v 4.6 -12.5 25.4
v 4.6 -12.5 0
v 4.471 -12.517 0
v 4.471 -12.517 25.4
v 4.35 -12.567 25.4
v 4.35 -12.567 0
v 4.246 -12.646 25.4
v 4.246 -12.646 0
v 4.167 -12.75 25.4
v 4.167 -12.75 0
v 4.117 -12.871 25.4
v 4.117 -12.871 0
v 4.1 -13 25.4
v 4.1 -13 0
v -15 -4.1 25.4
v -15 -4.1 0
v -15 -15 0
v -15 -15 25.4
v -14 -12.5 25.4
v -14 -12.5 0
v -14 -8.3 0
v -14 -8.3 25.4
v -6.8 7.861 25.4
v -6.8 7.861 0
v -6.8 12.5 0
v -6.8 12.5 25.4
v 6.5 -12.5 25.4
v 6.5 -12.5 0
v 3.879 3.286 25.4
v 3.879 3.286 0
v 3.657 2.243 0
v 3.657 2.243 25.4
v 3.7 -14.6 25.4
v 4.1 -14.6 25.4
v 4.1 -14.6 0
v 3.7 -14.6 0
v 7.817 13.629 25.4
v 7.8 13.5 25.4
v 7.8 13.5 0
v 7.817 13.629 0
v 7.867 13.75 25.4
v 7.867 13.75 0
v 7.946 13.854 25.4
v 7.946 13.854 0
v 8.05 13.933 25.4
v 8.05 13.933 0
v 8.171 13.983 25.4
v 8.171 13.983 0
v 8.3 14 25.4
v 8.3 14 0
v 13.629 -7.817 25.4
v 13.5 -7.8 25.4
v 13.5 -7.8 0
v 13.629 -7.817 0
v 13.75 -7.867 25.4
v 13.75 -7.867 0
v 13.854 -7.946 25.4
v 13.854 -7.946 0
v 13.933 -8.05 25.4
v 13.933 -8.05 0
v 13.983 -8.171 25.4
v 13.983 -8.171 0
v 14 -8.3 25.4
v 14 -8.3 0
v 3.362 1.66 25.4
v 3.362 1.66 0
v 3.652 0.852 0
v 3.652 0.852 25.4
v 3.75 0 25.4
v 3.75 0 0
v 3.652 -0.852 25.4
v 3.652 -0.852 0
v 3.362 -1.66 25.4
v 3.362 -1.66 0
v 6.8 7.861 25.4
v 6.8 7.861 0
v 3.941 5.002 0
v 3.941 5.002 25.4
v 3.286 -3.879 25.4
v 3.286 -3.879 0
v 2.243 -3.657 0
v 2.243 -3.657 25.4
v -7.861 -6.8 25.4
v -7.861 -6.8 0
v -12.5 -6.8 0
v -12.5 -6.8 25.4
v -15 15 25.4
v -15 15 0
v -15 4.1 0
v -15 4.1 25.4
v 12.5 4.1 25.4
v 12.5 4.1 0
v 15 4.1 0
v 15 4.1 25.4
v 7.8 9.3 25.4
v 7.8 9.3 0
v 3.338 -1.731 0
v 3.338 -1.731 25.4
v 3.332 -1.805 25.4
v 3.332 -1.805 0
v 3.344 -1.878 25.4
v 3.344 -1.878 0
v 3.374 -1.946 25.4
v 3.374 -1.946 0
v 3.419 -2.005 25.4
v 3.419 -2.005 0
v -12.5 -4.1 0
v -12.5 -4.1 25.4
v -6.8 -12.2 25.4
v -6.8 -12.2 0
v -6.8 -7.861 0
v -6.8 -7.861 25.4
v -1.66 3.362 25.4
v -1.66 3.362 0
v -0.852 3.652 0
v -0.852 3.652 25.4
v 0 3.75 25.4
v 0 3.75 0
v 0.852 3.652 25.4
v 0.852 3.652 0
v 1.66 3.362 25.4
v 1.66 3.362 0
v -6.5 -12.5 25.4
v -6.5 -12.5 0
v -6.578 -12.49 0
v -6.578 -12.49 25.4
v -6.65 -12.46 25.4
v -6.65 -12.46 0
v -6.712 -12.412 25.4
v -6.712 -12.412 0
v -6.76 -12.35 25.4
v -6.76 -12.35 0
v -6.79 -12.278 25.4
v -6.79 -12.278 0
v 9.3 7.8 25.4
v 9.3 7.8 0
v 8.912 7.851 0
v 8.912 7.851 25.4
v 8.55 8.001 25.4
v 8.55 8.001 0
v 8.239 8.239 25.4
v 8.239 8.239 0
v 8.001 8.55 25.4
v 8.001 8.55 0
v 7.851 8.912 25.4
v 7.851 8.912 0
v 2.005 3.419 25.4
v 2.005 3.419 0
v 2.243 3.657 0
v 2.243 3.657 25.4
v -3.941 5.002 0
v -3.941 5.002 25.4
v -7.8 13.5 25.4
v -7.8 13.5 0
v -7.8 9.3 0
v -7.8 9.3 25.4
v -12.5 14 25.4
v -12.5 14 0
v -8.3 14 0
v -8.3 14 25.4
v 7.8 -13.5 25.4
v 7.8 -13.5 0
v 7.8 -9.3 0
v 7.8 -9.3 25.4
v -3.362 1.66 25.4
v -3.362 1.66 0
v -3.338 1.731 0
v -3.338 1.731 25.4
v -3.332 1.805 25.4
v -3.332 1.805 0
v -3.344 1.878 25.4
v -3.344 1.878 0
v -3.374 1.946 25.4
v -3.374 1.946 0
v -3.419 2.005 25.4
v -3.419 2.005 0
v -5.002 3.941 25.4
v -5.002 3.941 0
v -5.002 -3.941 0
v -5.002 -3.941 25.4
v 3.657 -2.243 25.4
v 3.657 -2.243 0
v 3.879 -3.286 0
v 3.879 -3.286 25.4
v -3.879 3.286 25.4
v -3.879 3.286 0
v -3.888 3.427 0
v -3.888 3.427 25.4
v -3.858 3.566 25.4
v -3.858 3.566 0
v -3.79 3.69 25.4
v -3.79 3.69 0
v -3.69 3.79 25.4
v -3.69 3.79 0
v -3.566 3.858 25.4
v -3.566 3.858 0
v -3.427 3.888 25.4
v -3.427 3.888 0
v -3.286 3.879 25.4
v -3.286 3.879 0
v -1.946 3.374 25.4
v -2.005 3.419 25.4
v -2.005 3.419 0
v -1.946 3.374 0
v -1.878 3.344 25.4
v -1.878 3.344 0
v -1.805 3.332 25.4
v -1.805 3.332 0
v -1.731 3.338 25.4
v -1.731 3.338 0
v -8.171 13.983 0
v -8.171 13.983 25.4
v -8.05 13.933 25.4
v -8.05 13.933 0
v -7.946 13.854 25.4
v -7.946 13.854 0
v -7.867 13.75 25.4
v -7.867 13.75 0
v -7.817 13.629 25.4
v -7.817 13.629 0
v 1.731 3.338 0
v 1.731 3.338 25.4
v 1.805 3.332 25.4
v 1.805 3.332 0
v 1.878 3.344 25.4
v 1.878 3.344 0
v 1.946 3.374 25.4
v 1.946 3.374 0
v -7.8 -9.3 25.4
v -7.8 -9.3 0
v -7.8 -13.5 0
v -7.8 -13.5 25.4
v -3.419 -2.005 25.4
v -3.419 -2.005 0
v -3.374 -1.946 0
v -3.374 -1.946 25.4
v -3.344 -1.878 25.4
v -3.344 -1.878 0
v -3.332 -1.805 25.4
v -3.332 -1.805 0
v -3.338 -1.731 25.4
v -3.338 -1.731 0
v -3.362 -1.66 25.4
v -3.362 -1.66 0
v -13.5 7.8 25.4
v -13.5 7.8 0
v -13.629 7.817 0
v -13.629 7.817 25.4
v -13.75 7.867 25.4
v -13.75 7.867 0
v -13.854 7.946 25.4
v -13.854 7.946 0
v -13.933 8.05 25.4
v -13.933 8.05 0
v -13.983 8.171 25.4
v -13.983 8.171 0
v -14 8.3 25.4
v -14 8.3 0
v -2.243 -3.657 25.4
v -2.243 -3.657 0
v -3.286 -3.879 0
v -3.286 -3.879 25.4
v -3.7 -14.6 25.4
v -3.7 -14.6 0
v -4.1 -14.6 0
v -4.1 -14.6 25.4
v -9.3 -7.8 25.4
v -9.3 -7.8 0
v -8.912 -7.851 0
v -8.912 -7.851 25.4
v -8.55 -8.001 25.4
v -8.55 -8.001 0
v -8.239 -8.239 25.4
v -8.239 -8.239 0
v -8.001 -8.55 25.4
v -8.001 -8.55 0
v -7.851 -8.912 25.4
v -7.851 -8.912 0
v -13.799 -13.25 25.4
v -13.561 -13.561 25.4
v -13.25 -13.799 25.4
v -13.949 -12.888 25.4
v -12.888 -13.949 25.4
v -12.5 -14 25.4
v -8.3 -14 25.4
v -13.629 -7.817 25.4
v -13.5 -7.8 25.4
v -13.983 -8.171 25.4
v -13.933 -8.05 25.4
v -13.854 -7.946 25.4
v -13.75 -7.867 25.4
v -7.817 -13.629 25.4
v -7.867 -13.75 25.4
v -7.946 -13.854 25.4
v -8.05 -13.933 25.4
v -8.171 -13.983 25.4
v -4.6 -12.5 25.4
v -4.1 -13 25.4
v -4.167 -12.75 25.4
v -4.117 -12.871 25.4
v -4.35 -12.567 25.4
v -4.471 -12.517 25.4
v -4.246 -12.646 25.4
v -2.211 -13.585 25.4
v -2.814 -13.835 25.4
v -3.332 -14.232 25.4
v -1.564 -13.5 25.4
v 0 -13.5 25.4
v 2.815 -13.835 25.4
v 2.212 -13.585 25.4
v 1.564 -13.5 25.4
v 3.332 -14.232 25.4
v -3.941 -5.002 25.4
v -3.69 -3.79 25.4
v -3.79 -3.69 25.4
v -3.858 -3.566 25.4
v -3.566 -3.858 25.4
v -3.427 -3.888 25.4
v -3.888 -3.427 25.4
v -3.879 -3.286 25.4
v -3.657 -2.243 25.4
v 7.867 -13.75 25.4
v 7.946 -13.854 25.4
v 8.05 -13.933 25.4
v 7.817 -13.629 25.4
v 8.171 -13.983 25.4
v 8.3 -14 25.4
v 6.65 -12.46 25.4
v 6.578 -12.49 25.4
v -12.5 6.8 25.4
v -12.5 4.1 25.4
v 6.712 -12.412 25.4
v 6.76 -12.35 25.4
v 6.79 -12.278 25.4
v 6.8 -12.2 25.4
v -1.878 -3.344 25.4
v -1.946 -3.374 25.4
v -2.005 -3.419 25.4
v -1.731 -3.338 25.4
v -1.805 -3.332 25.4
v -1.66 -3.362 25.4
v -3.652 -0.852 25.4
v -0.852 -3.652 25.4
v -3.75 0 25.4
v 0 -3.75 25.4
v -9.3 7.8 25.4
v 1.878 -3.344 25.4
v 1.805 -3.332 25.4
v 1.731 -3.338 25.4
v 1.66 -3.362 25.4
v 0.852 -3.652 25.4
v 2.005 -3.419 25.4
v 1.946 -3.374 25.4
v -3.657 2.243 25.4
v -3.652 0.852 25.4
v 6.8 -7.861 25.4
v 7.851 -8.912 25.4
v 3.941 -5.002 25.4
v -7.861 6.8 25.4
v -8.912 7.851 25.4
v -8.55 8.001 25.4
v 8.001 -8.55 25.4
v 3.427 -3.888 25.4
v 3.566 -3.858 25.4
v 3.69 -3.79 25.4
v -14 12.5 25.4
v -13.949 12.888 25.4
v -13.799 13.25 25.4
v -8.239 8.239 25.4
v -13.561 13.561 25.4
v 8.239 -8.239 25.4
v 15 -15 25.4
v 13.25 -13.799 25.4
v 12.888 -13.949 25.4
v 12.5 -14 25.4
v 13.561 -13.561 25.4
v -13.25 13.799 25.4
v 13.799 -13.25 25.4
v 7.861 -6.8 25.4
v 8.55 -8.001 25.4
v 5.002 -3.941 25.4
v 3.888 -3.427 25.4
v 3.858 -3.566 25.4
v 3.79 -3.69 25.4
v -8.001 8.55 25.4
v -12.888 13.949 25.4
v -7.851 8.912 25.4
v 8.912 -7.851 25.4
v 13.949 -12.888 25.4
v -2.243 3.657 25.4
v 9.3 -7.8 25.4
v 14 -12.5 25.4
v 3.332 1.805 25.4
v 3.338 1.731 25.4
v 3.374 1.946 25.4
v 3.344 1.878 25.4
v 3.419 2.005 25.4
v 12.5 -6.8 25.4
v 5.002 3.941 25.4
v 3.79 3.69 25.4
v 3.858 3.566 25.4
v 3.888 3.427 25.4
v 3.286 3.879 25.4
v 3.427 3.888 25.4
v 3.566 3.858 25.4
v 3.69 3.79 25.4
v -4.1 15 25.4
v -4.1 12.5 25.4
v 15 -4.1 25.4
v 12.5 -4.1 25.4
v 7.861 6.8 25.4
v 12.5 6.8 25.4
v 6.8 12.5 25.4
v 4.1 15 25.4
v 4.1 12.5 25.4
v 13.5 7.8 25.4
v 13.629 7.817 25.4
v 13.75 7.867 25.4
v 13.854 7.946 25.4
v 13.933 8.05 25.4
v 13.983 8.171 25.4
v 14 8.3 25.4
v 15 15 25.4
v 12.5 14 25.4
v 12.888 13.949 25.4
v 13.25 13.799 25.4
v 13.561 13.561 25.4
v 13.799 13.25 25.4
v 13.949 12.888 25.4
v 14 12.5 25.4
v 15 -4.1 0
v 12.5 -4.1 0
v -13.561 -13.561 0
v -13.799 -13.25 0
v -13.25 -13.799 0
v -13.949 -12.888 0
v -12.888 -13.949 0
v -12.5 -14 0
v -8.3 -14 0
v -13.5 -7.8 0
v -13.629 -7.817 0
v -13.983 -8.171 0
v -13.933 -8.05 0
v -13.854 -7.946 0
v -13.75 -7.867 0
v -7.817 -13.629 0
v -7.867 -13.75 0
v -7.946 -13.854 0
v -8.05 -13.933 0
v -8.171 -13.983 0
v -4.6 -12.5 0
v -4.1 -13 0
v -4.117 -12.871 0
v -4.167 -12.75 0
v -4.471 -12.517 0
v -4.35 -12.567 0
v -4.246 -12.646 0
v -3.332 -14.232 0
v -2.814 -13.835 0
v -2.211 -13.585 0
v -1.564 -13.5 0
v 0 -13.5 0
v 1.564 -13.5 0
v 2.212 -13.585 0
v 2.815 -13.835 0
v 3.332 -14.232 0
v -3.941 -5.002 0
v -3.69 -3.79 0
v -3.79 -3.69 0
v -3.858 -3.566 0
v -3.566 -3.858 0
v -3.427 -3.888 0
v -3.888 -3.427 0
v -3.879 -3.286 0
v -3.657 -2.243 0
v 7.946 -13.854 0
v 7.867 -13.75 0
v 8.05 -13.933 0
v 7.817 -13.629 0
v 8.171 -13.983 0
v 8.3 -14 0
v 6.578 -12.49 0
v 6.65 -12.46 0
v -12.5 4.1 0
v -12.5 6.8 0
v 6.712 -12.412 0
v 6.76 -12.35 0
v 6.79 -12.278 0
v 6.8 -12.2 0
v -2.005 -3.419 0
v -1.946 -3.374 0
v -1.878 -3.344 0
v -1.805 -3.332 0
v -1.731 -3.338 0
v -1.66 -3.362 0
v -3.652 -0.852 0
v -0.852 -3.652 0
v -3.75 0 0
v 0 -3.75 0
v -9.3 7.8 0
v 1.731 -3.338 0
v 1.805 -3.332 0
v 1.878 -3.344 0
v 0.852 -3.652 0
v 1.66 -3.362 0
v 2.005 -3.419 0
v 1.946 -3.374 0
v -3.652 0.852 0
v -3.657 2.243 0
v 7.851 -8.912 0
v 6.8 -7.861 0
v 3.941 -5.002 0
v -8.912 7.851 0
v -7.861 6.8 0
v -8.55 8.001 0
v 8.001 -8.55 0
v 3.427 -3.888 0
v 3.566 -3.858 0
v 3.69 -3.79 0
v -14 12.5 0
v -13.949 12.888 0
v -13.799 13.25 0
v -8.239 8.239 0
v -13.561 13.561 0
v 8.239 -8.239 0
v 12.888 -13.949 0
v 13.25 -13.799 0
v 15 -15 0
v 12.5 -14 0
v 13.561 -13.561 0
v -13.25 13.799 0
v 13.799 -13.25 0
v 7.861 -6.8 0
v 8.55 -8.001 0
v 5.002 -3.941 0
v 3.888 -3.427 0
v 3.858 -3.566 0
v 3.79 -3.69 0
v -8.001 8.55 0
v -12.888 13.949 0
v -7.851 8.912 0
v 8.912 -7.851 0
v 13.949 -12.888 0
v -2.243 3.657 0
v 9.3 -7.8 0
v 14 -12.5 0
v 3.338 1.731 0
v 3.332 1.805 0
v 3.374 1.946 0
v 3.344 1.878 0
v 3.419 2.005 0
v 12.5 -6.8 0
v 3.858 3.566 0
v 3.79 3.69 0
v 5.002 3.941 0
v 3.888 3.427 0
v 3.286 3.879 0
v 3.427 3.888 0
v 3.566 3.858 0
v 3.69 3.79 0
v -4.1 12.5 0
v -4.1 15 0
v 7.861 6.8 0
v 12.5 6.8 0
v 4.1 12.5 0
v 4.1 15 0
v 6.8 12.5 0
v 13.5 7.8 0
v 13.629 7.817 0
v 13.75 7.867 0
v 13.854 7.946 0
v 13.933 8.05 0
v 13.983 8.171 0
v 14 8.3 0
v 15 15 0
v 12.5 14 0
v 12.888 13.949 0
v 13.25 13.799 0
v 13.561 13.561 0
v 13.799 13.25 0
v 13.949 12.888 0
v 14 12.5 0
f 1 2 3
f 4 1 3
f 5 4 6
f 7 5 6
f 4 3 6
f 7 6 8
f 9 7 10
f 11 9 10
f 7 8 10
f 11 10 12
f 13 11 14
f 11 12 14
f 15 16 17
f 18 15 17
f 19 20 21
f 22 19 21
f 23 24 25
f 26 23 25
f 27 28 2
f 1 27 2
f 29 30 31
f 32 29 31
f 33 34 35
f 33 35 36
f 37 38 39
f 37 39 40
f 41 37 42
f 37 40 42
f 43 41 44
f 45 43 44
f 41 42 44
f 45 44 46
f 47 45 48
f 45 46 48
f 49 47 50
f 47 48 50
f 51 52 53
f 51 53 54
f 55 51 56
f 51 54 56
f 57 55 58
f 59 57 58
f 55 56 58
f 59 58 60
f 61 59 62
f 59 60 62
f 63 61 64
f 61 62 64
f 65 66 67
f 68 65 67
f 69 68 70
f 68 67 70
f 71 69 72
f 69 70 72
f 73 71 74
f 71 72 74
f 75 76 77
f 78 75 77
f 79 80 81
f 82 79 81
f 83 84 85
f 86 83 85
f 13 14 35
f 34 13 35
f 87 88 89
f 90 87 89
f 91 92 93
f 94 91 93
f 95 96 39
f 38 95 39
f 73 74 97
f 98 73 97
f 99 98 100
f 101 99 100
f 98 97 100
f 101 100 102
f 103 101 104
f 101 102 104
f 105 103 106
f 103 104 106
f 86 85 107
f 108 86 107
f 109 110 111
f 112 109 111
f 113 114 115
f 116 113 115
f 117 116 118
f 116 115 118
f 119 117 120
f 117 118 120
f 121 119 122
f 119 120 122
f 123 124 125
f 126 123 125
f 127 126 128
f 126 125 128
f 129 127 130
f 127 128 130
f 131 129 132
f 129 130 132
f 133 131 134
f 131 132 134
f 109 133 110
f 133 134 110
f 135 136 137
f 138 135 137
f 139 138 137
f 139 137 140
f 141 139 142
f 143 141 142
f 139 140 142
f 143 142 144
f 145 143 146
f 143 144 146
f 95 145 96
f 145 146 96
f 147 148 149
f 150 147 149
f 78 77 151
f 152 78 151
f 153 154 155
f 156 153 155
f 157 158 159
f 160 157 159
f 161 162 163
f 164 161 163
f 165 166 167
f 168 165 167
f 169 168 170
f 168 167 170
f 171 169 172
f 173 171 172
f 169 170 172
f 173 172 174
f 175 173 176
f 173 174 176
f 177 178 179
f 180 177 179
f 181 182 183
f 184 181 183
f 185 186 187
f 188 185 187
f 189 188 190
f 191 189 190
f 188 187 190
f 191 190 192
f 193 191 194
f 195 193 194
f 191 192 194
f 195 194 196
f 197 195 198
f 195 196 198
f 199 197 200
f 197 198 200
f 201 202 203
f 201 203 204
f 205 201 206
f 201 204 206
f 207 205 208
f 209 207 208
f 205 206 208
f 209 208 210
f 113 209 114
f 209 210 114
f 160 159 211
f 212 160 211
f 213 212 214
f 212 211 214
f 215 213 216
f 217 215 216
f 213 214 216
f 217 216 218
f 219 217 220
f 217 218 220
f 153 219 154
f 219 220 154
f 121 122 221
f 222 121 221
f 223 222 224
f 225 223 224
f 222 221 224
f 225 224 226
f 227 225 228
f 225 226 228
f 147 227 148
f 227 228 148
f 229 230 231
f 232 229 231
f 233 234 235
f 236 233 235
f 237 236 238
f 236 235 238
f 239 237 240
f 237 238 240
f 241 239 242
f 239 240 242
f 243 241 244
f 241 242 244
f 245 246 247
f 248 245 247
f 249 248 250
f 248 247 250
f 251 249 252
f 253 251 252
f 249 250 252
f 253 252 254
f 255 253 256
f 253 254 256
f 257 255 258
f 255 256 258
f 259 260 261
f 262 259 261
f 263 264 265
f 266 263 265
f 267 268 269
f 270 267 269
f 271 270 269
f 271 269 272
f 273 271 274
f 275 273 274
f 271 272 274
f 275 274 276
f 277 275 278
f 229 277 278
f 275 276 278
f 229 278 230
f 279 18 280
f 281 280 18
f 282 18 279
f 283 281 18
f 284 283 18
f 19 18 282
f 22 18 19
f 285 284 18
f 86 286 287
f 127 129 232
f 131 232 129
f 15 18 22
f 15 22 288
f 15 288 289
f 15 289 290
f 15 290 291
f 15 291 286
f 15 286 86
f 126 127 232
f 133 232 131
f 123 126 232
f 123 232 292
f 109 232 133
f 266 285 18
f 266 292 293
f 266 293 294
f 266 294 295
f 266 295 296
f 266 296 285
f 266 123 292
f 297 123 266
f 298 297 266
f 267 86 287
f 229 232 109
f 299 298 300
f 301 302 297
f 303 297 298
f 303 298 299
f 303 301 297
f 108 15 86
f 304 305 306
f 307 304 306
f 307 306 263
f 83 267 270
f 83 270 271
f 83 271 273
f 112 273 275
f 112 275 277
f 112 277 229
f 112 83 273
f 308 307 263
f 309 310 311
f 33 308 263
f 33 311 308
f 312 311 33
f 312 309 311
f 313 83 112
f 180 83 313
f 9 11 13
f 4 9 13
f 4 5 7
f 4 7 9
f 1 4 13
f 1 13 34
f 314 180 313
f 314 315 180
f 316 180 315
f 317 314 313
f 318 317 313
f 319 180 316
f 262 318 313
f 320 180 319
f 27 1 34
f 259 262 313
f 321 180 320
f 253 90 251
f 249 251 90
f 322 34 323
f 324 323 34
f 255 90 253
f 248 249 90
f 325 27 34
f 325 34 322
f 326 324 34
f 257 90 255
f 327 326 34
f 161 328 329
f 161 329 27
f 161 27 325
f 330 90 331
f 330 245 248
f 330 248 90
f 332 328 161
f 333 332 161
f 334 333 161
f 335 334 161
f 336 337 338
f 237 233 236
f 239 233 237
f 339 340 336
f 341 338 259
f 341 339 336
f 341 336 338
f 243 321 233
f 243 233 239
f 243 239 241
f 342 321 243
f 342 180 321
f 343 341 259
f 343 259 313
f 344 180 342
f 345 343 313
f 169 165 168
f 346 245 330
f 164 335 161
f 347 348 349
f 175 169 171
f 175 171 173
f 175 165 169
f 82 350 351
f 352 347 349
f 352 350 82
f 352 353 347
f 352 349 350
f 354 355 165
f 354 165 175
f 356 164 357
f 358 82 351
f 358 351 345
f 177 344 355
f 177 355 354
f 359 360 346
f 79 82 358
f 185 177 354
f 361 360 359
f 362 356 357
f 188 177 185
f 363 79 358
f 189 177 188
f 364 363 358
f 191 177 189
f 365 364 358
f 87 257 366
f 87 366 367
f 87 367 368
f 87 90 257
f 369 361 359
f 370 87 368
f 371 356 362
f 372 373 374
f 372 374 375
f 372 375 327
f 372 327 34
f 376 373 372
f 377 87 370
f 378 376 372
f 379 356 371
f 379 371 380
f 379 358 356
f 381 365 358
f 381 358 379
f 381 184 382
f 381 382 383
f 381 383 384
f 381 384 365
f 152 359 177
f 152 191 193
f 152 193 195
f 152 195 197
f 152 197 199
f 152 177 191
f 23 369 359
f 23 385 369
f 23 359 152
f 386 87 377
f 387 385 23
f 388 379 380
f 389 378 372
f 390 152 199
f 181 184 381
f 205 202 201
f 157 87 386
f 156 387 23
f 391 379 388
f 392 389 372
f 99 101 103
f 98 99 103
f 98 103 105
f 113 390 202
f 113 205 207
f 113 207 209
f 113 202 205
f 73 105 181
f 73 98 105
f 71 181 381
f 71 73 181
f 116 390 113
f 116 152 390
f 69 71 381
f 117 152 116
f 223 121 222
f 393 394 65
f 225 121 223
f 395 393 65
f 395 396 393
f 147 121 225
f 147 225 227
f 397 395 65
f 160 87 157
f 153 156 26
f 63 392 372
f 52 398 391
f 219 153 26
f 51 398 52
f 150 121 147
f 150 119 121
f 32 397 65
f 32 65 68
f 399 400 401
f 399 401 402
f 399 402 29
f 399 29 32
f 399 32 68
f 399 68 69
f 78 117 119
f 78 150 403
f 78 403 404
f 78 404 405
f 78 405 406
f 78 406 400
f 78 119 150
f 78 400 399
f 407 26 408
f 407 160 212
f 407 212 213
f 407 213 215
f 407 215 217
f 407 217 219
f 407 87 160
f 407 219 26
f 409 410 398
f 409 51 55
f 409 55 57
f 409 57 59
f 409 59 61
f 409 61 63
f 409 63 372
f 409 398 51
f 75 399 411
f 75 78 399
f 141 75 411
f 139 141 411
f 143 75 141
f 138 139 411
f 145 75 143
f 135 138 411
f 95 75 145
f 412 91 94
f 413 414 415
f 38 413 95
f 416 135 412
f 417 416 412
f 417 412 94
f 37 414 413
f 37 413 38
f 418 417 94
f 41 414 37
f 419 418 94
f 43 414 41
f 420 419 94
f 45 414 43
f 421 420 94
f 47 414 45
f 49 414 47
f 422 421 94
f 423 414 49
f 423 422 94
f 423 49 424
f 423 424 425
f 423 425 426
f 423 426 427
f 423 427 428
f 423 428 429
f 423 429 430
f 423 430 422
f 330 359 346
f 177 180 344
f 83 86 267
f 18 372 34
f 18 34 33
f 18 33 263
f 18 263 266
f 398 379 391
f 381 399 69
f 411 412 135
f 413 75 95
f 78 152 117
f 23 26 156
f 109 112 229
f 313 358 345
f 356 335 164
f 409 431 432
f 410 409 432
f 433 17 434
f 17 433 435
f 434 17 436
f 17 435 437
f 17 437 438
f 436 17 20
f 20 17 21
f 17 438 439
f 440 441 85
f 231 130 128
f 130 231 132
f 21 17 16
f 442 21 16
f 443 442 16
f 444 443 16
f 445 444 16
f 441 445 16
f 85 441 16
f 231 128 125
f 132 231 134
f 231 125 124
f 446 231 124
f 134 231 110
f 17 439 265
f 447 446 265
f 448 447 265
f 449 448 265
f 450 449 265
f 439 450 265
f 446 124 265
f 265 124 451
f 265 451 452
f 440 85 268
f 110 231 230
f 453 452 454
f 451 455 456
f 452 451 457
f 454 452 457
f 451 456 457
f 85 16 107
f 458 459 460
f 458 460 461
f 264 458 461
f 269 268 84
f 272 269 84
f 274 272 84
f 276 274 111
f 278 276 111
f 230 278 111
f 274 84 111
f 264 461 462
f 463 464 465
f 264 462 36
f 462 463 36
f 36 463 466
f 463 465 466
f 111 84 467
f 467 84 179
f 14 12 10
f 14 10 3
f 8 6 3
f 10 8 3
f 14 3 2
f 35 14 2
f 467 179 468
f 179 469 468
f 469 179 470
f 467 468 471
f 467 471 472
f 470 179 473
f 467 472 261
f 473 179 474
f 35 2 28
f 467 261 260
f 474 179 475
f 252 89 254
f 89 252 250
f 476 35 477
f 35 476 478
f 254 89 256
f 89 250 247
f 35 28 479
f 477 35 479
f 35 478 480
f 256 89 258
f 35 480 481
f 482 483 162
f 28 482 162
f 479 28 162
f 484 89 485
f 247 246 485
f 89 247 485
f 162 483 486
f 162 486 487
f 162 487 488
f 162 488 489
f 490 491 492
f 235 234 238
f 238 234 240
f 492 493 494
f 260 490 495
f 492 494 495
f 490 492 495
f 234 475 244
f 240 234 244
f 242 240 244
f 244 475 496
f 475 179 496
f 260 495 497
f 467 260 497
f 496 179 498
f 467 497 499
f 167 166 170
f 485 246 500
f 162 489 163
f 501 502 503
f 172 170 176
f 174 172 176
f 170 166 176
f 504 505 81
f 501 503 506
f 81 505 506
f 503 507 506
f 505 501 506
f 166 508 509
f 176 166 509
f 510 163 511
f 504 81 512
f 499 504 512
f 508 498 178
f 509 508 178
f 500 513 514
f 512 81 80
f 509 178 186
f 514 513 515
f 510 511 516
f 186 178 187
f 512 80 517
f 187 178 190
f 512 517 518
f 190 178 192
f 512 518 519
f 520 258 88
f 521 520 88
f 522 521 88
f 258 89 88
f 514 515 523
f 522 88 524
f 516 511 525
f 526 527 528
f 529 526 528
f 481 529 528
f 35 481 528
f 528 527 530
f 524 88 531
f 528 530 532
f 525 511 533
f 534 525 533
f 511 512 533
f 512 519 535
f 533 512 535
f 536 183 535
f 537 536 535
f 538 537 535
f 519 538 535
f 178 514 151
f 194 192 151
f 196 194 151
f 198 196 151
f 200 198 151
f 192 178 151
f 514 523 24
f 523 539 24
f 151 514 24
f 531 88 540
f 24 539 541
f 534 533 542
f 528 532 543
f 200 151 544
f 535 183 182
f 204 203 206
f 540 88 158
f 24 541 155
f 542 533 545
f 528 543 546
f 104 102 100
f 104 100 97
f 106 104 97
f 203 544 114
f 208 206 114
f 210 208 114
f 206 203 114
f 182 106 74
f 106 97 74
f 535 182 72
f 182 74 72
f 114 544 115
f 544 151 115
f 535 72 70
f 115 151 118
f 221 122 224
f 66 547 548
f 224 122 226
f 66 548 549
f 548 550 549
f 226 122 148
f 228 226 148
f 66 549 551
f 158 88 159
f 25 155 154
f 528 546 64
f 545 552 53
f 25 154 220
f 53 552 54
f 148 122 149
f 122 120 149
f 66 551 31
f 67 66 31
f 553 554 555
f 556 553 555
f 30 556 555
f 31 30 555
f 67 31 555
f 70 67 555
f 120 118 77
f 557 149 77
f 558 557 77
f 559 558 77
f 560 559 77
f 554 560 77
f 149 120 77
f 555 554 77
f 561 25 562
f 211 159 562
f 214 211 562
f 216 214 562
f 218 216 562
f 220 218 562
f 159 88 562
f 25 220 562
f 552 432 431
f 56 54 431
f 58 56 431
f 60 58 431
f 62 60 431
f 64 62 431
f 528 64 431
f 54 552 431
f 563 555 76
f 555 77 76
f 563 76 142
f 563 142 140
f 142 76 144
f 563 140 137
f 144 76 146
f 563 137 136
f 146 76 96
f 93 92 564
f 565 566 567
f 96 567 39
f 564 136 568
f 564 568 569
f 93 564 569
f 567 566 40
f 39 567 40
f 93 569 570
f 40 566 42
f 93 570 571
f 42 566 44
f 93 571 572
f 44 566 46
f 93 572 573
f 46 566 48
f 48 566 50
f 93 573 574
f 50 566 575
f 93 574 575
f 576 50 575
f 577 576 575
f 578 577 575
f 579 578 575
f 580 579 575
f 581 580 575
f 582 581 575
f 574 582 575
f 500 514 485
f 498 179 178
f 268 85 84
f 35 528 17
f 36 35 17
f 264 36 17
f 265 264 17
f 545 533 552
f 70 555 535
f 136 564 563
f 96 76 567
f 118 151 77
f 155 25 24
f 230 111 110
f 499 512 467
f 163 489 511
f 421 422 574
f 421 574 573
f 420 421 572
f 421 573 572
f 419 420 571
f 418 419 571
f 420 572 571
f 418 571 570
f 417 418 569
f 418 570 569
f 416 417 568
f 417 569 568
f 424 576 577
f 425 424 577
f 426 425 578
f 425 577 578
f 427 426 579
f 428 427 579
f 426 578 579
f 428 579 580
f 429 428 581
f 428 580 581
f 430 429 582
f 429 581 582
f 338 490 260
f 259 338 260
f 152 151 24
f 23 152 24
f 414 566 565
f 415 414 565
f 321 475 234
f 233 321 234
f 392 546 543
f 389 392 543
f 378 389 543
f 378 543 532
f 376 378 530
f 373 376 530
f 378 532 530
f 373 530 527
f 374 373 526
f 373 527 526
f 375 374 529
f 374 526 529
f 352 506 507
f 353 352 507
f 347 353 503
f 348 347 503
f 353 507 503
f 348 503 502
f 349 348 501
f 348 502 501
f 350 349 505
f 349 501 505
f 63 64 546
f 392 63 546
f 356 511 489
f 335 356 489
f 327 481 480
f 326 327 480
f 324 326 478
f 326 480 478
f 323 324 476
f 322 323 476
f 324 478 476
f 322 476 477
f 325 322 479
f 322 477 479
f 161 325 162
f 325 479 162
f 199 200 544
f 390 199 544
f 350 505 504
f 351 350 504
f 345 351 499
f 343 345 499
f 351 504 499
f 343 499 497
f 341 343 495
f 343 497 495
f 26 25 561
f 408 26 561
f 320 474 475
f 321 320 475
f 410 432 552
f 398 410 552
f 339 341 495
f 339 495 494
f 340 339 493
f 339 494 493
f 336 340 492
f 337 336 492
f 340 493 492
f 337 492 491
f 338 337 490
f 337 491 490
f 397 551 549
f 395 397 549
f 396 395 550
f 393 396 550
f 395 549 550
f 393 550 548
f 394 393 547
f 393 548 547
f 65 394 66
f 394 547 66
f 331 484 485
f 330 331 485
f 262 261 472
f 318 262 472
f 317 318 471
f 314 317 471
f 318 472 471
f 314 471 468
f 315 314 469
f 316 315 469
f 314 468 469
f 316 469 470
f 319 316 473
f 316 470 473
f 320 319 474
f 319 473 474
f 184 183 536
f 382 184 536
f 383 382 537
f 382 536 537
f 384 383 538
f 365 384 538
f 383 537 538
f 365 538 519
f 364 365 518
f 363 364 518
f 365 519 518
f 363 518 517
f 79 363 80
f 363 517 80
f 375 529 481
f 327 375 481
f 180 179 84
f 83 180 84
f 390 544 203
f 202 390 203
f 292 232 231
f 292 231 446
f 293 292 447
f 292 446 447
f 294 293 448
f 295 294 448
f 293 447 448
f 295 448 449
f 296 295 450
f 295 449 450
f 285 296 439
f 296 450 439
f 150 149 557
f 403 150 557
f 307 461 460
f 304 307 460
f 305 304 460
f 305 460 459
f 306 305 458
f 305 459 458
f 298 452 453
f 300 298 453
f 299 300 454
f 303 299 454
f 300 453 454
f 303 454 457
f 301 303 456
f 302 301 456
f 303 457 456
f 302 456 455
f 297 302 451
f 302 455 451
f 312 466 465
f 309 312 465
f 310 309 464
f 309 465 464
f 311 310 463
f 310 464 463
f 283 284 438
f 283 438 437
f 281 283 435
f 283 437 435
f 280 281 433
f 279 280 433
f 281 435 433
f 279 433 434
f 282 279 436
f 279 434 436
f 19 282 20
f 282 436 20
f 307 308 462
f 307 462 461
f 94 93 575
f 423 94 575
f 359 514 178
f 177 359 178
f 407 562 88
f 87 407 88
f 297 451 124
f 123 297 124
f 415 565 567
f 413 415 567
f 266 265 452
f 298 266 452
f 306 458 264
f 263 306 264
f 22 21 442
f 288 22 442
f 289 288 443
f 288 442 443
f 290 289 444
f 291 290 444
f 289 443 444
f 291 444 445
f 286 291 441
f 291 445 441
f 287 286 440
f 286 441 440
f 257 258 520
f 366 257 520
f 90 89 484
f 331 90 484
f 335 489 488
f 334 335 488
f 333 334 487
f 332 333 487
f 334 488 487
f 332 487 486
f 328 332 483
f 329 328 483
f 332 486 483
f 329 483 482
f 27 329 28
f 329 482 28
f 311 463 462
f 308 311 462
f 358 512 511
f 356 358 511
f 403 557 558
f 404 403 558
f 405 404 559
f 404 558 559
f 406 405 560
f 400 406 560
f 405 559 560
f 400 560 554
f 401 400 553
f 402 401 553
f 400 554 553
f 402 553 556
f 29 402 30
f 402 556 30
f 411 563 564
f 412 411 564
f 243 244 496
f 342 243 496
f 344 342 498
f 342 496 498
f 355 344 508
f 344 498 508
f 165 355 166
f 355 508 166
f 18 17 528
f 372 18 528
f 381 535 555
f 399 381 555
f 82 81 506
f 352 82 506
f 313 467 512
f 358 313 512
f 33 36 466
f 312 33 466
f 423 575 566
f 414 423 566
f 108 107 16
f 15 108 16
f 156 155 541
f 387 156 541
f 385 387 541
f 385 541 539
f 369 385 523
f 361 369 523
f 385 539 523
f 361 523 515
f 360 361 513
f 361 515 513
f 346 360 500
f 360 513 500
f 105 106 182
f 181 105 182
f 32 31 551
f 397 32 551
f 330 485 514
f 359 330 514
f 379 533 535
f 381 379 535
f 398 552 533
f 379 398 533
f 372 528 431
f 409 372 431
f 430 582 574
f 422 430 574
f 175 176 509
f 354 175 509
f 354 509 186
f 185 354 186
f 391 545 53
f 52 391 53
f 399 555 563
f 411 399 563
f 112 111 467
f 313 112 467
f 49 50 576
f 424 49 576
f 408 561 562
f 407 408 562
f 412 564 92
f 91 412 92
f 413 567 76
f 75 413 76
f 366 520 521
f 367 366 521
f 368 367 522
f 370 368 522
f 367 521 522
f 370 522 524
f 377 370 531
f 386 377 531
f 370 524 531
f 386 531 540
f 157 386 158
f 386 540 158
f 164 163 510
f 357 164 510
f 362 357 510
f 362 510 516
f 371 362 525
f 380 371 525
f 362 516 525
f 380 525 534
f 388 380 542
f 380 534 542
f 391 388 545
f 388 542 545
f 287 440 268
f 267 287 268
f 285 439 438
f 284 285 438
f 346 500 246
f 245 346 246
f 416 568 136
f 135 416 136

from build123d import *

# Parameters (mm, degrees)
EXTRUSION3_DEPTH = 25.4


with BuildPart() as part:
    # Sketch1 → Extrusion3 (new body)
    with BuildSketch(Plane.XY):
        Polygon((-15.000000011, 14.999999975), (-14.999999998, 4.099998455), (-12.499999998, 4.099998455), (-12.499999998, 6.799995405), (-7.860655598, 6.799995405), (-5.002158168, 3.941497975), (-5.002158168, -3.941498015), (-7.860655598, -6.799995445), (-12.499999998, -6.799995445), (-12.499999998, -4.099998495), (-14.999999998, -4.099998495), (-14.999999998, -15.000000015), (14.999999982, -15.000000015), (14.999999982, -4.099998495), (12.499999982, -4.099998495), (12.499999982, -6.799995445), (7.860655582, -6.799995445), (5.002158152, -3.941498015), (5.002158152, 3.941497975), (7.860655582, 6.799995405), (12.499999982, 6.799995405), (12.499999982, 4.099998455), (14.999999982, 4.099998455), (14.999999982, 14.999999975), (4.099998462, 14.999999975), (4.099998462, 12.499999975), (6.799995412, 12.499999975), (6.799995412, 7.860655575), (3.941497982, 5.002158145), (-3.941498008, 5.002158145), (-6.799995438, 7.860655575), (-6.799995438, 12.499999975), (-4.099998488, 12.499999975), (-4.099998488, 14.999999975), align=None)
        with BuildLine():
            Line((13.499999982, 7.799995395), (9.299995412, 7.799995395))
            ThreePointArc((9.299995412, 7.799995395), (8.239335242, 8.239335225), (7.799995412, 9.299995395))
            Line((7.799995412, 9.299995395), (7.799995412, 13.499999965))
            ThreePointArc((7.799995412, 13.499999965), (7.946442022, 13.853553355), (8.299995412, 13.999999965))
            Line((8.299995412, 13.999999965), (12.499999982, 13.999999965))
            ThreePointArc((12.499999982, 13.999999965), (13.560660152, 13.560660135), (13.999999982, 12.499999965))
            Line((13.999999982, 12.499999965), (13.999999982, 8.299995395))
            ThreePointArc((13.999999982, 8.299995395), (13.853553372, 7.946442005), (13.499999982, 7.799995395))
        make_face(mode=Mode.SUBTRACT)
        with BuildLine():
            Line((-7.799995428, 13.499999965), (-7.799995428, 9.299995395))
            ThreePointArc((-7.799995428, 9.299995395), (-8.239335258, 8.239335225), (-9.299995428, 7.799995395))
            Line((-9.299995428, 7.799995395), (-13.499999998, 7.799995395))
            ThreePointArc((-13.499999998, 7.799995395), (-13.853553388, 7.946442005), (-13.999999998, 8.299995395))
            Line((-13.999999998, 8.299995395), (-13.999999998, 12.499999965))
            ThreePointArc((-13.999999998, 12.499999965), (-13.560660168, 13.560660135), (-12.499999998, 13.999999965))
            Line((-12.499999998, 13.999999965), (-8.299995428, 13.999999965))
            ThreePointArc((-8.299995428, 13.999999965), (-7.946442038, 13.853553355), (-7.799995428, 13.499999965))
        make_face(mode=Mode.SUBTRACT)
        with BuildLine():
            Line((7.799995412, -13.500000015), (7.799995412, -9.299995445))
            ThreePointArc((7.799995412, -9.299995445), (8.239335242, -8.239335275), (9.299995412, -7.799995445))
            Line((9.299995412, -7.799995445), (13.499999982, -7.799995445))
            ThreePointArc((13.499999982, -7.799995445), (13.853553372, -7.946442055), (13.999999982, -8.299995445))
            Line((13.999999982, -8.299995445), (13.999999982, -12.500000015))
            ThreePointArc((13.999999982, -12.500000015), (13.560660152, -13.560660185), (12.499999982, -14.000000015))
            Line((12.499999982, -14.000000015), (8.299995412, -14.000000015))
            ThreePointArc((8.299995412, -14.000000015), (7.946442022, -13.853553405), (7.799995412, -13.500000015))
        make_face(mode=Mode.SUBTRACT)
        with BuildLine():
            Line((-13.499999998, -7.799995445), (-9.299995428, -7.799995445))
            ThreePointArc((-9.299995428, -7.799995445), (-8.239335258, -8.239335275), (-7.799995428, -9.299995445))
            Line((-7.799995428, -9.299995445), (-7.799995428, -13.500000015))
            ThreePointArc((-7.799995428, -13.500000015), (-7.946442038, -13.853553405), (-8.299995428, -14.000000015))
            Line((-8.299995428, -14.000000015), (-12.499999998, -14.000000015))
            ThreePointArc((-12.499999998, -14.000000015), (-13.560660168, -13.560660185), (-13.999999998, -12.500000015))
            Line((-13.999999998, -12.500000015), (-13.999999998, -8.299995445))
            ThreePointArc((-13.999999998, -8.299995445), (-13.853553388, -7.946442055), (-13.499999998, -7.799995445))
        make_face(mode=Mode.SUBTRACT)
        with BuildLine():
            Line((-3.285876608, 3.878886835), (-2.243073548, 3.657287075))
            Line((-2.243073548, 3.657287075), (-2.005134008, 3.419347535))
            ThreePointArc((-2.005134008, 3.419347535), (-1.841800007, 3.335474925), (-1.660187018, 3.362481085))
            ThreePointArc((-1.660187018, 3.362481085), (-2.3e-08, 3.749999985), (1.660186972, 3.362481085))
            ThreePointArc((1.660186972, 3.362481085), (1.841799961, 3.335474925), (2.005133962, 3.419347535))
            Line((2.005133962, 3.419347535), (2.243073502, 3.657287075))
            Line((2.243073502, 3.657287075), (3.285876562, 3.878886835))
            ThreePointArc((3.285876562, 3.878886835), (3.743361172, 3.743361195), (3.878886812, 3.285876585))
            Line((3.878886812, 3.285876585), (3.657287052, 2.243073525))
            Line((3.657287052, 2.243073525), (3.419347512, 2.005133985))
            ThreePointArc((3.419347512, 2.005133985), (3.335474902, 1.841799984), (3.362481062, 1.660186995))
            ThreePointArc((3.362481062, 1.660186995), (3.749999954, -2e-09), (3.362481062, -1.660186995))
            ThreePointArc((3.362481062, -1.660186995), (3.335474902, -1.841799984), (3.419347512, -2.005133985))
            Line((3.419347512, -2.005133985), (3.657287052, -2.243073525))
            Line((3.657287052, -2.243073525), (3.878886812, -3.285876585))
            ThreePointArc((3.878886812, -3.285876585), (3.743361172, -3.743361195), (3.285876562, -3.878886835))
            Line((3.285876562, -3.878886835), (2.243073502, -3.657287075))
            Line((2.243073502, -3.657287075), (2.005133962, -3.419347535))
            ThreePointArc((2.005133962, -3.419347535), (1.841799961, -3.335474925), (1.660186972, -3.362481085))
            ThreePointArc((1.660186972, -3.362481085), (-2.3e-08, -3.74999999), (-1.660187018, -3.362481085))
            ThreePointArc((-1.660187018, -3.362481085), (-1.841800007, -3.335474925), (-2.005134008, -3.419347535))
            Line((-2.005134008, -3.419347535), (-2.243073548, -3.657287075))
            Line((-2.243073548, -3.657287075), (-3.285876608, -3.878886835))
            ThreePointArc((-3.285876608, -3.878886835), (-3.743361218, -3.743361195), (-3.878886858, -3.285876585))
            Line((-3.878886858, -3.285876585), (-3.657287098, -2.243073525))
            Line((-3.657287098, -2.243073525), (-3.419347558, -2.005133985))
            ThreePointArc((-3.419347558, -2.005133985), (-3.335474948, -1.841799984), (-3.362481108, -1.660186995))
            ThreePointArc((-3.362481108, -1.660186995), (-3.750000021, -2e-09), (-3.362481108, 1.660186995))
            ThreePointArc((-3.362481108, 1.660186995), (-3.335474948, 1.841799984), (-3.419347558, 2.005133985))
            Line((-3.419347558, 2.005133985), (-3.657287098, 2.243073525))
            Line((-3.657287098, 2.243073525), (-3.878886858, 3.285876585))
            ThreePointArc((-3.878886858, 3.285876585), (-3.743361218, 3.743361195), (-3.285876608, 3.878886835))
        make_face(mode=Mode.SUBTRACT)
        with BuildLine():
            Line((-6.799995418, -7.860655625), (-3.941497998, -5.002158195))
            Line((-3.941497998, -5.002158195), (3.941497992, -5.002158195))
            Line((3.941497992, -5.002158195), (6.799995422, -7.860655625))
            Line((6.799995422, -7.860655625), (6.799995422, -12.199996975))
            ThreePointArc((6.799995422, -12.199996975), (6.712130925, -12.412130132), (6.500000002, -12.500000025))
            Line((6.500000002, -12.500000025), (4.599998472, -12.500000025))
            ThreePointArc((4.599998472, -12.500000025), (4.246445082, -12.646446635), (4.099998472, -13.000000025))
            Line((4.099998472, -13.000000025), (4.099998472, -14.600000025))
            Line((4.099998472, -14.600000025), (3.699990832, -14.600000025))
            Line((3.699990832, -14.600000025), (3.332307072, -14.232291555))
            ThreePointArc((3.332307072, -14.232291555), (2.521228054, -13.690316336), (1.564480612, -13.499999115))
            Line((1.564480612, -13.499999115), (-5.8e-08, -13.499999185))
            Line((-5.8e-08, -13.499999185), (-1.564449118, -13.499999135))
            ThreePointArc((-1.564449118, -13.499999135), (-2.521158976, -13.690300794), (-3.332218038, -14.232234065))
            Line((-3.332218038, -14.232234065), (-3.699983218, -14.600000025))
            Line((-3.699983218, -14.600000025), (-4.099998468, -14.600000025))
            Line((-4.099998468, -14.600000025), (-4.099998468, -13.000000025))
            ThreePointArc((-4.099998468, -13.000000025), (-4.246445078, -12.646446635), (-4.599998468, -12.500000025))
            Line((-4.599998468, -12.500000025), (-6.499999998, -12.500000025))
            ThreePointArc((-6.499999998, -12.500000025), (-6.712130926, -12.412130137), (-6.799995418, -12.199996975))
            Line((-6.799995418, -12.199996975), (-6.799995418, -7.860655625))
        make_face(mode=Mode.SUBTRACT)
    extrude(amount=EXTRUSION3_DEPTH)


solid = part.part
